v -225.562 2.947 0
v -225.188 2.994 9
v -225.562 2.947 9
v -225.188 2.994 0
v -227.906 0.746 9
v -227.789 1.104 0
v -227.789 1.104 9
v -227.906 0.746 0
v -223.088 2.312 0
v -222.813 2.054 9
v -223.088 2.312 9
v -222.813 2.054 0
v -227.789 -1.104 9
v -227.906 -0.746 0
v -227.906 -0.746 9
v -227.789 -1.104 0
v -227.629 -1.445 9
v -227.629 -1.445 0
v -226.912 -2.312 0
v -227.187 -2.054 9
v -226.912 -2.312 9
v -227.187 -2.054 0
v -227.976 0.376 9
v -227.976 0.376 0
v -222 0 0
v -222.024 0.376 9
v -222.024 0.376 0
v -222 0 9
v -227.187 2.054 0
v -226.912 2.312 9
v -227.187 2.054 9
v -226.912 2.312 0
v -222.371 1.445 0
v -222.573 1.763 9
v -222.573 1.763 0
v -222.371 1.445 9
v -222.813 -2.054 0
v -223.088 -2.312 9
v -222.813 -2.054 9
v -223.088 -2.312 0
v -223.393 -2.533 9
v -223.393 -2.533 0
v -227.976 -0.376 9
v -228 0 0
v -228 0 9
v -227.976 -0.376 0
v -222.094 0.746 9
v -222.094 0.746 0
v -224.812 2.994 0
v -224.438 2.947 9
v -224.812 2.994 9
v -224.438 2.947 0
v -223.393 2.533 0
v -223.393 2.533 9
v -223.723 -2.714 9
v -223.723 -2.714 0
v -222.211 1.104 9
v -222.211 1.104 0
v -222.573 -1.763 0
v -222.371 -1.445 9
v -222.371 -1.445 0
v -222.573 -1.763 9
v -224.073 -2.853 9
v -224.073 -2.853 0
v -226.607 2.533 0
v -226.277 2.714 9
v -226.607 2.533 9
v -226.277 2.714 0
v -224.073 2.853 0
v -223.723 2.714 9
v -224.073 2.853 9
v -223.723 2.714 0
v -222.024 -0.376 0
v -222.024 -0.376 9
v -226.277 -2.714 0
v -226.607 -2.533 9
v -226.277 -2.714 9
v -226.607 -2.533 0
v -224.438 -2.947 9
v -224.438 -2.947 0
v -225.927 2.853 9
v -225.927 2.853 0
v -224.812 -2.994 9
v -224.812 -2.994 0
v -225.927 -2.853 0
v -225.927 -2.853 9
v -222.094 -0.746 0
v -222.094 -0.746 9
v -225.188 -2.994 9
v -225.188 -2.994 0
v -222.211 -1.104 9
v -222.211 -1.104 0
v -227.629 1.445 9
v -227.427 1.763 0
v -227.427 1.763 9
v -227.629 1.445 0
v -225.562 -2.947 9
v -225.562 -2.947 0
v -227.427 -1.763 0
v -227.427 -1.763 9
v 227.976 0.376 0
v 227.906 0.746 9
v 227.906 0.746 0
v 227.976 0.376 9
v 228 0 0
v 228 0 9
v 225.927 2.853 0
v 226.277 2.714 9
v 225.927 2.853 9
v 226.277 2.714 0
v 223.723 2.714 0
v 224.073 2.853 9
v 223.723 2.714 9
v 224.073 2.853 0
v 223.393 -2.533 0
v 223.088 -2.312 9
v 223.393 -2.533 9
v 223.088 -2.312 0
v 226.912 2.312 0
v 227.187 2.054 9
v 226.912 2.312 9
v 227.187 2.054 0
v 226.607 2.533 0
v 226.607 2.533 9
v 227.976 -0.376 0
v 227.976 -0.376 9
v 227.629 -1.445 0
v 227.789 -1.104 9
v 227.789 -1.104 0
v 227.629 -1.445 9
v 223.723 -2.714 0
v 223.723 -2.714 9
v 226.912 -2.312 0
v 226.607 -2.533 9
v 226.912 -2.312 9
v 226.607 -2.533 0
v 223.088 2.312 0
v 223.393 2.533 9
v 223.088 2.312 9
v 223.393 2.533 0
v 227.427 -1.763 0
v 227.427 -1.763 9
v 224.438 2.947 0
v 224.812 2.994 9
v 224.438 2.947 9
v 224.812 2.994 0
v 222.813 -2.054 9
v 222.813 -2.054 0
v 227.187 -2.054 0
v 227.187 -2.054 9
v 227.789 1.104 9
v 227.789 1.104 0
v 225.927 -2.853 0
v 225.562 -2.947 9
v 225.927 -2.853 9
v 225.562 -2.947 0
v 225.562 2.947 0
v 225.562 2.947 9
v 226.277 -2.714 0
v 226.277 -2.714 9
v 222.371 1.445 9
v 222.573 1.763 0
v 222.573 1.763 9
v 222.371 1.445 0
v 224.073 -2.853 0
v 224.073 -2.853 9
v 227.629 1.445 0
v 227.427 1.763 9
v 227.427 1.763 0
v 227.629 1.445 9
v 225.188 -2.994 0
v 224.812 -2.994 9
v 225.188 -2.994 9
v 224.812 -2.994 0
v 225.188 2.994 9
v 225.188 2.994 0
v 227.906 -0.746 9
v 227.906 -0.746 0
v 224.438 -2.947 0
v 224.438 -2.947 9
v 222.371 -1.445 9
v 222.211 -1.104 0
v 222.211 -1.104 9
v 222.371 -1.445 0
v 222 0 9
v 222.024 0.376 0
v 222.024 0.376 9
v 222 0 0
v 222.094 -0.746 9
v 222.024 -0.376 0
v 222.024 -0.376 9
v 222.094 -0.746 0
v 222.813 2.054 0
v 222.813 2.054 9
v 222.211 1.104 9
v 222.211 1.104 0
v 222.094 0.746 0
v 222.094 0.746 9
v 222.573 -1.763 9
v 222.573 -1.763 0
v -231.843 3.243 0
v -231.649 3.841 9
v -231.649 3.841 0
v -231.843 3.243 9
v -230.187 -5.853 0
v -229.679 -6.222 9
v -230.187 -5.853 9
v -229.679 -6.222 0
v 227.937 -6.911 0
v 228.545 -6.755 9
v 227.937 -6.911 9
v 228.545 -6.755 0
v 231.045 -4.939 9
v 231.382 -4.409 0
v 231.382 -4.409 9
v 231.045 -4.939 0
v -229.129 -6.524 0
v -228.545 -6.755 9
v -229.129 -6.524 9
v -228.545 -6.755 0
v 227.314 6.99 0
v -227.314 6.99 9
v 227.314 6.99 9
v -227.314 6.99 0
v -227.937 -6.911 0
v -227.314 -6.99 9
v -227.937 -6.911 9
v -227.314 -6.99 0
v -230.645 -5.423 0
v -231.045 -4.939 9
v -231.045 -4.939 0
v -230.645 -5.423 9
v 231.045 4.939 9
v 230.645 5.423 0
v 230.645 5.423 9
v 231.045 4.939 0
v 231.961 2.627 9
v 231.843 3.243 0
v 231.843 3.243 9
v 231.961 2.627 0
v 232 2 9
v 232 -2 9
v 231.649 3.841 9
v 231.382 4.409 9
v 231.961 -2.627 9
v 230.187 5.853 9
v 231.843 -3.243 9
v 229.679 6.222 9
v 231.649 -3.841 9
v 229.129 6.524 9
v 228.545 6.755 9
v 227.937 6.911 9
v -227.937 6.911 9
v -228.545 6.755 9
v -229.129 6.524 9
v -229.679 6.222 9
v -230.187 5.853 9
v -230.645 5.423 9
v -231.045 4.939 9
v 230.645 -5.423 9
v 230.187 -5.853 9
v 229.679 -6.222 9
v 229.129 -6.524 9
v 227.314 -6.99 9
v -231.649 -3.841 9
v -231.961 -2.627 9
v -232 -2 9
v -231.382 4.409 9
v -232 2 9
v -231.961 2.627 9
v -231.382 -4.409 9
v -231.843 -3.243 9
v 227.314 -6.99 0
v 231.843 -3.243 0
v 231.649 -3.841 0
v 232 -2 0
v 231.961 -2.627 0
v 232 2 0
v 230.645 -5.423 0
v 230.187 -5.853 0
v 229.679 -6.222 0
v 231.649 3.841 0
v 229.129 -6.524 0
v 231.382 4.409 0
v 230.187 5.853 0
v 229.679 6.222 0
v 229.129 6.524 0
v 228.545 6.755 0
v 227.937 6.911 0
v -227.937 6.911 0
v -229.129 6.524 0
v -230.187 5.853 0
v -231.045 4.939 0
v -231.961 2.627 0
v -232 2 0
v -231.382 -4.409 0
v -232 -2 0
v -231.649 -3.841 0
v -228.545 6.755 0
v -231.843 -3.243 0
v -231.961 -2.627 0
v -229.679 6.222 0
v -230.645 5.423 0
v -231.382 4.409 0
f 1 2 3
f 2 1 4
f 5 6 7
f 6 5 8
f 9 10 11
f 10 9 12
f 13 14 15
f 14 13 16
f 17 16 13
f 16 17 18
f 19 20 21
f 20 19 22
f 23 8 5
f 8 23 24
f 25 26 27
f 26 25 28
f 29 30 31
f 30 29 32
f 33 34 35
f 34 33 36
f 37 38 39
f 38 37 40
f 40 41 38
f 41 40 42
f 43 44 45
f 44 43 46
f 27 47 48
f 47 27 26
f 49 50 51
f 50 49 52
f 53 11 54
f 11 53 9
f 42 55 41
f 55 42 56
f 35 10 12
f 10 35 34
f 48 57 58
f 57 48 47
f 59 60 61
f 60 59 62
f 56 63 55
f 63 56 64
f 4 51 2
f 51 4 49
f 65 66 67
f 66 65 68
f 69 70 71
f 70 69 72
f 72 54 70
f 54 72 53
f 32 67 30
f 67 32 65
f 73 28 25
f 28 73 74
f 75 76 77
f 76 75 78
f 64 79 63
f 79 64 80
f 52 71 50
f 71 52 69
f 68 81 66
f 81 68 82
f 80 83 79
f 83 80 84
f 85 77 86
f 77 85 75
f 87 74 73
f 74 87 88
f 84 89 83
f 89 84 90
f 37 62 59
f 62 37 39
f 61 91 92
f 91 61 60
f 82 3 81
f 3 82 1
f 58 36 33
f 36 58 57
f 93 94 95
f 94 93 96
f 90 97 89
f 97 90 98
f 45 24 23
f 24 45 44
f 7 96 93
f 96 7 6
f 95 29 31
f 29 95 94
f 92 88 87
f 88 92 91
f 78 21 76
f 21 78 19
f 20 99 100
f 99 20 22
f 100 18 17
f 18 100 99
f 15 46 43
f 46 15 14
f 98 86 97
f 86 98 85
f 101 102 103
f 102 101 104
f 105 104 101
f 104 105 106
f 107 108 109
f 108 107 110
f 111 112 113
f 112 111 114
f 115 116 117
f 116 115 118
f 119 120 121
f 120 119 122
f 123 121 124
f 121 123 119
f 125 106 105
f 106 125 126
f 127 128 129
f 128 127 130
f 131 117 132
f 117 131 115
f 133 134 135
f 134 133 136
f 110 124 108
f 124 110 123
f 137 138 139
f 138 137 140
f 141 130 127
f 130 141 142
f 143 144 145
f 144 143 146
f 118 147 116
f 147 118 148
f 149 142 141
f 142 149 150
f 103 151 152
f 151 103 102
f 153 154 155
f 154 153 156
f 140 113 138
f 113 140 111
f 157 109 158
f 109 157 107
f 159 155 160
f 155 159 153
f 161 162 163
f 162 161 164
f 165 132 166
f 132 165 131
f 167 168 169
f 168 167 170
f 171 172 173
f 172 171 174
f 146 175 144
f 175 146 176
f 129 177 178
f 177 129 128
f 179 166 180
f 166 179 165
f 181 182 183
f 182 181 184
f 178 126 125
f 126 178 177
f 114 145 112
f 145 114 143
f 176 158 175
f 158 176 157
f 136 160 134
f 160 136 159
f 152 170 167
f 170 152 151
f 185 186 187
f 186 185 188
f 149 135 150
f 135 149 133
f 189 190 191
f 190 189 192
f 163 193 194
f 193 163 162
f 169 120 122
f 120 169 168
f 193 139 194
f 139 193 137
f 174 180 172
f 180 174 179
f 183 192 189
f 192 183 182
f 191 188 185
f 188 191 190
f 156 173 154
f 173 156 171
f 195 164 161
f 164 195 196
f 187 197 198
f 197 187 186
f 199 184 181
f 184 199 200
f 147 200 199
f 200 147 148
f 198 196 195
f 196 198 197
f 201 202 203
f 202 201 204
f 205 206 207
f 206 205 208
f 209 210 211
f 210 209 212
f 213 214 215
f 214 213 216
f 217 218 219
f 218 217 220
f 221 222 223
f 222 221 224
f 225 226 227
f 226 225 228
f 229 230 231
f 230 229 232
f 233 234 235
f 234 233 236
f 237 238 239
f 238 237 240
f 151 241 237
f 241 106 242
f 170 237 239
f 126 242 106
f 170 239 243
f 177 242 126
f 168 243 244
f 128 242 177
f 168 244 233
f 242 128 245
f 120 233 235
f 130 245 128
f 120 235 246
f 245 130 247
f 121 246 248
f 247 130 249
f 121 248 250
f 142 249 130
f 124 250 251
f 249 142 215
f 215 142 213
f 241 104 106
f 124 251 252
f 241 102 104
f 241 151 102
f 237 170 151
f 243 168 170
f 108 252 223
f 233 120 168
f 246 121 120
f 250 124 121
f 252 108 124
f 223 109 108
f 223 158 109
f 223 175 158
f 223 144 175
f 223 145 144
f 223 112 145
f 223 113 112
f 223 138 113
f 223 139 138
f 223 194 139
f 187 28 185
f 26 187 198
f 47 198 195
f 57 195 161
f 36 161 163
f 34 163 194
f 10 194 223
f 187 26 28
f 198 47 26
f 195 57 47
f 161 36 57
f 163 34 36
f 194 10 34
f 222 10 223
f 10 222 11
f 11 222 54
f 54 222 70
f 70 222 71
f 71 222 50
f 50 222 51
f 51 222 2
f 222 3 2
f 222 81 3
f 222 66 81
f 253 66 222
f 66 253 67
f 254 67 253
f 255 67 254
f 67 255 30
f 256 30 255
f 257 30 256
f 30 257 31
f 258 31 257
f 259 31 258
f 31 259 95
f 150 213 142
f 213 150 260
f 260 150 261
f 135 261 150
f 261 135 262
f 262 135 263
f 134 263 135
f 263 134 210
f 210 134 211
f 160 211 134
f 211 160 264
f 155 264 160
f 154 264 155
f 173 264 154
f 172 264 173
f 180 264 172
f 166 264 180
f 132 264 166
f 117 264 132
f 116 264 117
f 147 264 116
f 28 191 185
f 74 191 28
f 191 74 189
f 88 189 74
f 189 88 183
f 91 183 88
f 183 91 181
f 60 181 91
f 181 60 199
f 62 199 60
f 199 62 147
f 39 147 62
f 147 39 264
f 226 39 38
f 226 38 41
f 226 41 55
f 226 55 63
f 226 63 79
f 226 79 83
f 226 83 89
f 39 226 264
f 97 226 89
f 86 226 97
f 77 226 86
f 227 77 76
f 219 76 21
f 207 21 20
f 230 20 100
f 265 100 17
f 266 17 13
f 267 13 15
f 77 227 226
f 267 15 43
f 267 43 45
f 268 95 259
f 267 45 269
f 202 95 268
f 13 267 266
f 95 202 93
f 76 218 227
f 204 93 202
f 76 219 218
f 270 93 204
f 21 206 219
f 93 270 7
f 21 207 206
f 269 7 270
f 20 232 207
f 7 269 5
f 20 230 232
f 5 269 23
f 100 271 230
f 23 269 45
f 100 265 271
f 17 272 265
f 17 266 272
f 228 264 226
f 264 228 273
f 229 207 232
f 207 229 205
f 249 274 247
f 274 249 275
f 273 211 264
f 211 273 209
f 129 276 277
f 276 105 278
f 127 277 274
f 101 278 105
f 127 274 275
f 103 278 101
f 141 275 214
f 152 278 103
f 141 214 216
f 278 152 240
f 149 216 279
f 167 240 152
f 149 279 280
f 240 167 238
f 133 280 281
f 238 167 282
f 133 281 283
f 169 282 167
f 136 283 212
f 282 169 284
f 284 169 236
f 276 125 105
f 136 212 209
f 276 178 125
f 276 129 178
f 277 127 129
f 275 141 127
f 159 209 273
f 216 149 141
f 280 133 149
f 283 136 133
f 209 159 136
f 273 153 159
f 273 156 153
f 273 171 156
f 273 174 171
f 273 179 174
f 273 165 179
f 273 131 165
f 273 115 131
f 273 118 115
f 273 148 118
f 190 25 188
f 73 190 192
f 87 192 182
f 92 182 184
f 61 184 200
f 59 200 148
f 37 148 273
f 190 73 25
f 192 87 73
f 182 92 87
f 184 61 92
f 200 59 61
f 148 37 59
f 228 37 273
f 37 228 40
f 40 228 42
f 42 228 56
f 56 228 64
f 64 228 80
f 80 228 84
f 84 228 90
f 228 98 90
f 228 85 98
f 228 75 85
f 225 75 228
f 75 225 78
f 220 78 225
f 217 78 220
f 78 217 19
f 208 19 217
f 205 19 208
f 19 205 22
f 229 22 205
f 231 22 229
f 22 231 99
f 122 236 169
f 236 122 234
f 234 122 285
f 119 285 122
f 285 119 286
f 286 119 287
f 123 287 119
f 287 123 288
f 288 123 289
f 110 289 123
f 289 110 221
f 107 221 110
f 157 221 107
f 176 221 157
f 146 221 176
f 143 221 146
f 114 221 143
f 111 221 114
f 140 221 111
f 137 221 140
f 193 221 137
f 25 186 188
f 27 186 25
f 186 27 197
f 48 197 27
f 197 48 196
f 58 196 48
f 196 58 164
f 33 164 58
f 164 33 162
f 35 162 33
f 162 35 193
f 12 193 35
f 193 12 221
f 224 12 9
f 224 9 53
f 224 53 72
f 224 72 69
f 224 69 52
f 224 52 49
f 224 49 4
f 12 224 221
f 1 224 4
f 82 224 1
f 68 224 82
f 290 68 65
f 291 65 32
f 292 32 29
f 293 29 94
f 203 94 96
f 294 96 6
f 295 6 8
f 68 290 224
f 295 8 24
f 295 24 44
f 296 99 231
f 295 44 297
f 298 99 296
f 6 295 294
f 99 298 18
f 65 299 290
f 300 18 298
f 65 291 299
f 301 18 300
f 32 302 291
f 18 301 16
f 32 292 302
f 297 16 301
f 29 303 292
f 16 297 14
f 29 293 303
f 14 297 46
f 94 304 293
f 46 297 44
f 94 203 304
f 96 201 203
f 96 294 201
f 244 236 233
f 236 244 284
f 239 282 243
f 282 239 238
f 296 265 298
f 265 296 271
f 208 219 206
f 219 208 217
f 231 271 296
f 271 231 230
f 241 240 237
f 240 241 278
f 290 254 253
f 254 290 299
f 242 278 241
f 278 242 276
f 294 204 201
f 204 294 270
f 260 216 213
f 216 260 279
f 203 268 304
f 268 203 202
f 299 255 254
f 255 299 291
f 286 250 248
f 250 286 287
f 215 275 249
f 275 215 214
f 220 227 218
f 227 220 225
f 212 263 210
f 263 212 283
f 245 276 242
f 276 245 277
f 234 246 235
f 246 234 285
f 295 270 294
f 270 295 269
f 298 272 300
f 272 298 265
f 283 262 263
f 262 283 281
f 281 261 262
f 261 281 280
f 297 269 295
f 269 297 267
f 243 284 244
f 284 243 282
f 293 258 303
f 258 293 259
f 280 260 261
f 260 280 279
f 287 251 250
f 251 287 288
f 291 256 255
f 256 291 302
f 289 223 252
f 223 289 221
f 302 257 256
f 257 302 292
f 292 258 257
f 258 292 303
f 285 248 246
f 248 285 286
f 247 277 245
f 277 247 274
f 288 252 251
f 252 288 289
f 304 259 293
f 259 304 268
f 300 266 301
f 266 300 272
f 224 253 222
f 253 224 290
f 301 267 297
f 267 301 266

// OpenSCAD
$fn = 50;


difference() {
	union() {
		hull() {
			translate(v = [-227.0000000000, 2.0000000000, 0]) {
				cylinder(h = 9, r = 5);
			}
			translate(v = [227.0000000000, 2.0000000000, 0]) {
				cylinder(h = 9, r = 5);
			}
			translate(v = [-227.0000000000, -2.0000000000, 0]) {
				cylinder(h = 9, r = 5);
			}
			translate(v = [227.0000000000, -2.0000000000, 0]) {
				cylinder(h = 9, r = 5);
			}
		}
	}
	union() {
		translate(v = [-225.0000000000, 0.0000000000, -100.0000000000]) {
			cylinder(h = 200, r = 3.0000000000);
		}
		translate(v = [-225.0000000000, 0.0000000000, -100.0000000000]) {
			cylinder(h = 200, r = 3.0000000000);
		}
		translate(v = [225.0000000000, 0.0000000000, -100.0000000000]) {
			cylinder(h = 200, r = 3.0000000000);
		}
		translate(v = [225.0000000000, 0.0000000000, -100.0000000000]) {
			cylinder(h = 200, r = 3.0000000000);
		}
	}
}
